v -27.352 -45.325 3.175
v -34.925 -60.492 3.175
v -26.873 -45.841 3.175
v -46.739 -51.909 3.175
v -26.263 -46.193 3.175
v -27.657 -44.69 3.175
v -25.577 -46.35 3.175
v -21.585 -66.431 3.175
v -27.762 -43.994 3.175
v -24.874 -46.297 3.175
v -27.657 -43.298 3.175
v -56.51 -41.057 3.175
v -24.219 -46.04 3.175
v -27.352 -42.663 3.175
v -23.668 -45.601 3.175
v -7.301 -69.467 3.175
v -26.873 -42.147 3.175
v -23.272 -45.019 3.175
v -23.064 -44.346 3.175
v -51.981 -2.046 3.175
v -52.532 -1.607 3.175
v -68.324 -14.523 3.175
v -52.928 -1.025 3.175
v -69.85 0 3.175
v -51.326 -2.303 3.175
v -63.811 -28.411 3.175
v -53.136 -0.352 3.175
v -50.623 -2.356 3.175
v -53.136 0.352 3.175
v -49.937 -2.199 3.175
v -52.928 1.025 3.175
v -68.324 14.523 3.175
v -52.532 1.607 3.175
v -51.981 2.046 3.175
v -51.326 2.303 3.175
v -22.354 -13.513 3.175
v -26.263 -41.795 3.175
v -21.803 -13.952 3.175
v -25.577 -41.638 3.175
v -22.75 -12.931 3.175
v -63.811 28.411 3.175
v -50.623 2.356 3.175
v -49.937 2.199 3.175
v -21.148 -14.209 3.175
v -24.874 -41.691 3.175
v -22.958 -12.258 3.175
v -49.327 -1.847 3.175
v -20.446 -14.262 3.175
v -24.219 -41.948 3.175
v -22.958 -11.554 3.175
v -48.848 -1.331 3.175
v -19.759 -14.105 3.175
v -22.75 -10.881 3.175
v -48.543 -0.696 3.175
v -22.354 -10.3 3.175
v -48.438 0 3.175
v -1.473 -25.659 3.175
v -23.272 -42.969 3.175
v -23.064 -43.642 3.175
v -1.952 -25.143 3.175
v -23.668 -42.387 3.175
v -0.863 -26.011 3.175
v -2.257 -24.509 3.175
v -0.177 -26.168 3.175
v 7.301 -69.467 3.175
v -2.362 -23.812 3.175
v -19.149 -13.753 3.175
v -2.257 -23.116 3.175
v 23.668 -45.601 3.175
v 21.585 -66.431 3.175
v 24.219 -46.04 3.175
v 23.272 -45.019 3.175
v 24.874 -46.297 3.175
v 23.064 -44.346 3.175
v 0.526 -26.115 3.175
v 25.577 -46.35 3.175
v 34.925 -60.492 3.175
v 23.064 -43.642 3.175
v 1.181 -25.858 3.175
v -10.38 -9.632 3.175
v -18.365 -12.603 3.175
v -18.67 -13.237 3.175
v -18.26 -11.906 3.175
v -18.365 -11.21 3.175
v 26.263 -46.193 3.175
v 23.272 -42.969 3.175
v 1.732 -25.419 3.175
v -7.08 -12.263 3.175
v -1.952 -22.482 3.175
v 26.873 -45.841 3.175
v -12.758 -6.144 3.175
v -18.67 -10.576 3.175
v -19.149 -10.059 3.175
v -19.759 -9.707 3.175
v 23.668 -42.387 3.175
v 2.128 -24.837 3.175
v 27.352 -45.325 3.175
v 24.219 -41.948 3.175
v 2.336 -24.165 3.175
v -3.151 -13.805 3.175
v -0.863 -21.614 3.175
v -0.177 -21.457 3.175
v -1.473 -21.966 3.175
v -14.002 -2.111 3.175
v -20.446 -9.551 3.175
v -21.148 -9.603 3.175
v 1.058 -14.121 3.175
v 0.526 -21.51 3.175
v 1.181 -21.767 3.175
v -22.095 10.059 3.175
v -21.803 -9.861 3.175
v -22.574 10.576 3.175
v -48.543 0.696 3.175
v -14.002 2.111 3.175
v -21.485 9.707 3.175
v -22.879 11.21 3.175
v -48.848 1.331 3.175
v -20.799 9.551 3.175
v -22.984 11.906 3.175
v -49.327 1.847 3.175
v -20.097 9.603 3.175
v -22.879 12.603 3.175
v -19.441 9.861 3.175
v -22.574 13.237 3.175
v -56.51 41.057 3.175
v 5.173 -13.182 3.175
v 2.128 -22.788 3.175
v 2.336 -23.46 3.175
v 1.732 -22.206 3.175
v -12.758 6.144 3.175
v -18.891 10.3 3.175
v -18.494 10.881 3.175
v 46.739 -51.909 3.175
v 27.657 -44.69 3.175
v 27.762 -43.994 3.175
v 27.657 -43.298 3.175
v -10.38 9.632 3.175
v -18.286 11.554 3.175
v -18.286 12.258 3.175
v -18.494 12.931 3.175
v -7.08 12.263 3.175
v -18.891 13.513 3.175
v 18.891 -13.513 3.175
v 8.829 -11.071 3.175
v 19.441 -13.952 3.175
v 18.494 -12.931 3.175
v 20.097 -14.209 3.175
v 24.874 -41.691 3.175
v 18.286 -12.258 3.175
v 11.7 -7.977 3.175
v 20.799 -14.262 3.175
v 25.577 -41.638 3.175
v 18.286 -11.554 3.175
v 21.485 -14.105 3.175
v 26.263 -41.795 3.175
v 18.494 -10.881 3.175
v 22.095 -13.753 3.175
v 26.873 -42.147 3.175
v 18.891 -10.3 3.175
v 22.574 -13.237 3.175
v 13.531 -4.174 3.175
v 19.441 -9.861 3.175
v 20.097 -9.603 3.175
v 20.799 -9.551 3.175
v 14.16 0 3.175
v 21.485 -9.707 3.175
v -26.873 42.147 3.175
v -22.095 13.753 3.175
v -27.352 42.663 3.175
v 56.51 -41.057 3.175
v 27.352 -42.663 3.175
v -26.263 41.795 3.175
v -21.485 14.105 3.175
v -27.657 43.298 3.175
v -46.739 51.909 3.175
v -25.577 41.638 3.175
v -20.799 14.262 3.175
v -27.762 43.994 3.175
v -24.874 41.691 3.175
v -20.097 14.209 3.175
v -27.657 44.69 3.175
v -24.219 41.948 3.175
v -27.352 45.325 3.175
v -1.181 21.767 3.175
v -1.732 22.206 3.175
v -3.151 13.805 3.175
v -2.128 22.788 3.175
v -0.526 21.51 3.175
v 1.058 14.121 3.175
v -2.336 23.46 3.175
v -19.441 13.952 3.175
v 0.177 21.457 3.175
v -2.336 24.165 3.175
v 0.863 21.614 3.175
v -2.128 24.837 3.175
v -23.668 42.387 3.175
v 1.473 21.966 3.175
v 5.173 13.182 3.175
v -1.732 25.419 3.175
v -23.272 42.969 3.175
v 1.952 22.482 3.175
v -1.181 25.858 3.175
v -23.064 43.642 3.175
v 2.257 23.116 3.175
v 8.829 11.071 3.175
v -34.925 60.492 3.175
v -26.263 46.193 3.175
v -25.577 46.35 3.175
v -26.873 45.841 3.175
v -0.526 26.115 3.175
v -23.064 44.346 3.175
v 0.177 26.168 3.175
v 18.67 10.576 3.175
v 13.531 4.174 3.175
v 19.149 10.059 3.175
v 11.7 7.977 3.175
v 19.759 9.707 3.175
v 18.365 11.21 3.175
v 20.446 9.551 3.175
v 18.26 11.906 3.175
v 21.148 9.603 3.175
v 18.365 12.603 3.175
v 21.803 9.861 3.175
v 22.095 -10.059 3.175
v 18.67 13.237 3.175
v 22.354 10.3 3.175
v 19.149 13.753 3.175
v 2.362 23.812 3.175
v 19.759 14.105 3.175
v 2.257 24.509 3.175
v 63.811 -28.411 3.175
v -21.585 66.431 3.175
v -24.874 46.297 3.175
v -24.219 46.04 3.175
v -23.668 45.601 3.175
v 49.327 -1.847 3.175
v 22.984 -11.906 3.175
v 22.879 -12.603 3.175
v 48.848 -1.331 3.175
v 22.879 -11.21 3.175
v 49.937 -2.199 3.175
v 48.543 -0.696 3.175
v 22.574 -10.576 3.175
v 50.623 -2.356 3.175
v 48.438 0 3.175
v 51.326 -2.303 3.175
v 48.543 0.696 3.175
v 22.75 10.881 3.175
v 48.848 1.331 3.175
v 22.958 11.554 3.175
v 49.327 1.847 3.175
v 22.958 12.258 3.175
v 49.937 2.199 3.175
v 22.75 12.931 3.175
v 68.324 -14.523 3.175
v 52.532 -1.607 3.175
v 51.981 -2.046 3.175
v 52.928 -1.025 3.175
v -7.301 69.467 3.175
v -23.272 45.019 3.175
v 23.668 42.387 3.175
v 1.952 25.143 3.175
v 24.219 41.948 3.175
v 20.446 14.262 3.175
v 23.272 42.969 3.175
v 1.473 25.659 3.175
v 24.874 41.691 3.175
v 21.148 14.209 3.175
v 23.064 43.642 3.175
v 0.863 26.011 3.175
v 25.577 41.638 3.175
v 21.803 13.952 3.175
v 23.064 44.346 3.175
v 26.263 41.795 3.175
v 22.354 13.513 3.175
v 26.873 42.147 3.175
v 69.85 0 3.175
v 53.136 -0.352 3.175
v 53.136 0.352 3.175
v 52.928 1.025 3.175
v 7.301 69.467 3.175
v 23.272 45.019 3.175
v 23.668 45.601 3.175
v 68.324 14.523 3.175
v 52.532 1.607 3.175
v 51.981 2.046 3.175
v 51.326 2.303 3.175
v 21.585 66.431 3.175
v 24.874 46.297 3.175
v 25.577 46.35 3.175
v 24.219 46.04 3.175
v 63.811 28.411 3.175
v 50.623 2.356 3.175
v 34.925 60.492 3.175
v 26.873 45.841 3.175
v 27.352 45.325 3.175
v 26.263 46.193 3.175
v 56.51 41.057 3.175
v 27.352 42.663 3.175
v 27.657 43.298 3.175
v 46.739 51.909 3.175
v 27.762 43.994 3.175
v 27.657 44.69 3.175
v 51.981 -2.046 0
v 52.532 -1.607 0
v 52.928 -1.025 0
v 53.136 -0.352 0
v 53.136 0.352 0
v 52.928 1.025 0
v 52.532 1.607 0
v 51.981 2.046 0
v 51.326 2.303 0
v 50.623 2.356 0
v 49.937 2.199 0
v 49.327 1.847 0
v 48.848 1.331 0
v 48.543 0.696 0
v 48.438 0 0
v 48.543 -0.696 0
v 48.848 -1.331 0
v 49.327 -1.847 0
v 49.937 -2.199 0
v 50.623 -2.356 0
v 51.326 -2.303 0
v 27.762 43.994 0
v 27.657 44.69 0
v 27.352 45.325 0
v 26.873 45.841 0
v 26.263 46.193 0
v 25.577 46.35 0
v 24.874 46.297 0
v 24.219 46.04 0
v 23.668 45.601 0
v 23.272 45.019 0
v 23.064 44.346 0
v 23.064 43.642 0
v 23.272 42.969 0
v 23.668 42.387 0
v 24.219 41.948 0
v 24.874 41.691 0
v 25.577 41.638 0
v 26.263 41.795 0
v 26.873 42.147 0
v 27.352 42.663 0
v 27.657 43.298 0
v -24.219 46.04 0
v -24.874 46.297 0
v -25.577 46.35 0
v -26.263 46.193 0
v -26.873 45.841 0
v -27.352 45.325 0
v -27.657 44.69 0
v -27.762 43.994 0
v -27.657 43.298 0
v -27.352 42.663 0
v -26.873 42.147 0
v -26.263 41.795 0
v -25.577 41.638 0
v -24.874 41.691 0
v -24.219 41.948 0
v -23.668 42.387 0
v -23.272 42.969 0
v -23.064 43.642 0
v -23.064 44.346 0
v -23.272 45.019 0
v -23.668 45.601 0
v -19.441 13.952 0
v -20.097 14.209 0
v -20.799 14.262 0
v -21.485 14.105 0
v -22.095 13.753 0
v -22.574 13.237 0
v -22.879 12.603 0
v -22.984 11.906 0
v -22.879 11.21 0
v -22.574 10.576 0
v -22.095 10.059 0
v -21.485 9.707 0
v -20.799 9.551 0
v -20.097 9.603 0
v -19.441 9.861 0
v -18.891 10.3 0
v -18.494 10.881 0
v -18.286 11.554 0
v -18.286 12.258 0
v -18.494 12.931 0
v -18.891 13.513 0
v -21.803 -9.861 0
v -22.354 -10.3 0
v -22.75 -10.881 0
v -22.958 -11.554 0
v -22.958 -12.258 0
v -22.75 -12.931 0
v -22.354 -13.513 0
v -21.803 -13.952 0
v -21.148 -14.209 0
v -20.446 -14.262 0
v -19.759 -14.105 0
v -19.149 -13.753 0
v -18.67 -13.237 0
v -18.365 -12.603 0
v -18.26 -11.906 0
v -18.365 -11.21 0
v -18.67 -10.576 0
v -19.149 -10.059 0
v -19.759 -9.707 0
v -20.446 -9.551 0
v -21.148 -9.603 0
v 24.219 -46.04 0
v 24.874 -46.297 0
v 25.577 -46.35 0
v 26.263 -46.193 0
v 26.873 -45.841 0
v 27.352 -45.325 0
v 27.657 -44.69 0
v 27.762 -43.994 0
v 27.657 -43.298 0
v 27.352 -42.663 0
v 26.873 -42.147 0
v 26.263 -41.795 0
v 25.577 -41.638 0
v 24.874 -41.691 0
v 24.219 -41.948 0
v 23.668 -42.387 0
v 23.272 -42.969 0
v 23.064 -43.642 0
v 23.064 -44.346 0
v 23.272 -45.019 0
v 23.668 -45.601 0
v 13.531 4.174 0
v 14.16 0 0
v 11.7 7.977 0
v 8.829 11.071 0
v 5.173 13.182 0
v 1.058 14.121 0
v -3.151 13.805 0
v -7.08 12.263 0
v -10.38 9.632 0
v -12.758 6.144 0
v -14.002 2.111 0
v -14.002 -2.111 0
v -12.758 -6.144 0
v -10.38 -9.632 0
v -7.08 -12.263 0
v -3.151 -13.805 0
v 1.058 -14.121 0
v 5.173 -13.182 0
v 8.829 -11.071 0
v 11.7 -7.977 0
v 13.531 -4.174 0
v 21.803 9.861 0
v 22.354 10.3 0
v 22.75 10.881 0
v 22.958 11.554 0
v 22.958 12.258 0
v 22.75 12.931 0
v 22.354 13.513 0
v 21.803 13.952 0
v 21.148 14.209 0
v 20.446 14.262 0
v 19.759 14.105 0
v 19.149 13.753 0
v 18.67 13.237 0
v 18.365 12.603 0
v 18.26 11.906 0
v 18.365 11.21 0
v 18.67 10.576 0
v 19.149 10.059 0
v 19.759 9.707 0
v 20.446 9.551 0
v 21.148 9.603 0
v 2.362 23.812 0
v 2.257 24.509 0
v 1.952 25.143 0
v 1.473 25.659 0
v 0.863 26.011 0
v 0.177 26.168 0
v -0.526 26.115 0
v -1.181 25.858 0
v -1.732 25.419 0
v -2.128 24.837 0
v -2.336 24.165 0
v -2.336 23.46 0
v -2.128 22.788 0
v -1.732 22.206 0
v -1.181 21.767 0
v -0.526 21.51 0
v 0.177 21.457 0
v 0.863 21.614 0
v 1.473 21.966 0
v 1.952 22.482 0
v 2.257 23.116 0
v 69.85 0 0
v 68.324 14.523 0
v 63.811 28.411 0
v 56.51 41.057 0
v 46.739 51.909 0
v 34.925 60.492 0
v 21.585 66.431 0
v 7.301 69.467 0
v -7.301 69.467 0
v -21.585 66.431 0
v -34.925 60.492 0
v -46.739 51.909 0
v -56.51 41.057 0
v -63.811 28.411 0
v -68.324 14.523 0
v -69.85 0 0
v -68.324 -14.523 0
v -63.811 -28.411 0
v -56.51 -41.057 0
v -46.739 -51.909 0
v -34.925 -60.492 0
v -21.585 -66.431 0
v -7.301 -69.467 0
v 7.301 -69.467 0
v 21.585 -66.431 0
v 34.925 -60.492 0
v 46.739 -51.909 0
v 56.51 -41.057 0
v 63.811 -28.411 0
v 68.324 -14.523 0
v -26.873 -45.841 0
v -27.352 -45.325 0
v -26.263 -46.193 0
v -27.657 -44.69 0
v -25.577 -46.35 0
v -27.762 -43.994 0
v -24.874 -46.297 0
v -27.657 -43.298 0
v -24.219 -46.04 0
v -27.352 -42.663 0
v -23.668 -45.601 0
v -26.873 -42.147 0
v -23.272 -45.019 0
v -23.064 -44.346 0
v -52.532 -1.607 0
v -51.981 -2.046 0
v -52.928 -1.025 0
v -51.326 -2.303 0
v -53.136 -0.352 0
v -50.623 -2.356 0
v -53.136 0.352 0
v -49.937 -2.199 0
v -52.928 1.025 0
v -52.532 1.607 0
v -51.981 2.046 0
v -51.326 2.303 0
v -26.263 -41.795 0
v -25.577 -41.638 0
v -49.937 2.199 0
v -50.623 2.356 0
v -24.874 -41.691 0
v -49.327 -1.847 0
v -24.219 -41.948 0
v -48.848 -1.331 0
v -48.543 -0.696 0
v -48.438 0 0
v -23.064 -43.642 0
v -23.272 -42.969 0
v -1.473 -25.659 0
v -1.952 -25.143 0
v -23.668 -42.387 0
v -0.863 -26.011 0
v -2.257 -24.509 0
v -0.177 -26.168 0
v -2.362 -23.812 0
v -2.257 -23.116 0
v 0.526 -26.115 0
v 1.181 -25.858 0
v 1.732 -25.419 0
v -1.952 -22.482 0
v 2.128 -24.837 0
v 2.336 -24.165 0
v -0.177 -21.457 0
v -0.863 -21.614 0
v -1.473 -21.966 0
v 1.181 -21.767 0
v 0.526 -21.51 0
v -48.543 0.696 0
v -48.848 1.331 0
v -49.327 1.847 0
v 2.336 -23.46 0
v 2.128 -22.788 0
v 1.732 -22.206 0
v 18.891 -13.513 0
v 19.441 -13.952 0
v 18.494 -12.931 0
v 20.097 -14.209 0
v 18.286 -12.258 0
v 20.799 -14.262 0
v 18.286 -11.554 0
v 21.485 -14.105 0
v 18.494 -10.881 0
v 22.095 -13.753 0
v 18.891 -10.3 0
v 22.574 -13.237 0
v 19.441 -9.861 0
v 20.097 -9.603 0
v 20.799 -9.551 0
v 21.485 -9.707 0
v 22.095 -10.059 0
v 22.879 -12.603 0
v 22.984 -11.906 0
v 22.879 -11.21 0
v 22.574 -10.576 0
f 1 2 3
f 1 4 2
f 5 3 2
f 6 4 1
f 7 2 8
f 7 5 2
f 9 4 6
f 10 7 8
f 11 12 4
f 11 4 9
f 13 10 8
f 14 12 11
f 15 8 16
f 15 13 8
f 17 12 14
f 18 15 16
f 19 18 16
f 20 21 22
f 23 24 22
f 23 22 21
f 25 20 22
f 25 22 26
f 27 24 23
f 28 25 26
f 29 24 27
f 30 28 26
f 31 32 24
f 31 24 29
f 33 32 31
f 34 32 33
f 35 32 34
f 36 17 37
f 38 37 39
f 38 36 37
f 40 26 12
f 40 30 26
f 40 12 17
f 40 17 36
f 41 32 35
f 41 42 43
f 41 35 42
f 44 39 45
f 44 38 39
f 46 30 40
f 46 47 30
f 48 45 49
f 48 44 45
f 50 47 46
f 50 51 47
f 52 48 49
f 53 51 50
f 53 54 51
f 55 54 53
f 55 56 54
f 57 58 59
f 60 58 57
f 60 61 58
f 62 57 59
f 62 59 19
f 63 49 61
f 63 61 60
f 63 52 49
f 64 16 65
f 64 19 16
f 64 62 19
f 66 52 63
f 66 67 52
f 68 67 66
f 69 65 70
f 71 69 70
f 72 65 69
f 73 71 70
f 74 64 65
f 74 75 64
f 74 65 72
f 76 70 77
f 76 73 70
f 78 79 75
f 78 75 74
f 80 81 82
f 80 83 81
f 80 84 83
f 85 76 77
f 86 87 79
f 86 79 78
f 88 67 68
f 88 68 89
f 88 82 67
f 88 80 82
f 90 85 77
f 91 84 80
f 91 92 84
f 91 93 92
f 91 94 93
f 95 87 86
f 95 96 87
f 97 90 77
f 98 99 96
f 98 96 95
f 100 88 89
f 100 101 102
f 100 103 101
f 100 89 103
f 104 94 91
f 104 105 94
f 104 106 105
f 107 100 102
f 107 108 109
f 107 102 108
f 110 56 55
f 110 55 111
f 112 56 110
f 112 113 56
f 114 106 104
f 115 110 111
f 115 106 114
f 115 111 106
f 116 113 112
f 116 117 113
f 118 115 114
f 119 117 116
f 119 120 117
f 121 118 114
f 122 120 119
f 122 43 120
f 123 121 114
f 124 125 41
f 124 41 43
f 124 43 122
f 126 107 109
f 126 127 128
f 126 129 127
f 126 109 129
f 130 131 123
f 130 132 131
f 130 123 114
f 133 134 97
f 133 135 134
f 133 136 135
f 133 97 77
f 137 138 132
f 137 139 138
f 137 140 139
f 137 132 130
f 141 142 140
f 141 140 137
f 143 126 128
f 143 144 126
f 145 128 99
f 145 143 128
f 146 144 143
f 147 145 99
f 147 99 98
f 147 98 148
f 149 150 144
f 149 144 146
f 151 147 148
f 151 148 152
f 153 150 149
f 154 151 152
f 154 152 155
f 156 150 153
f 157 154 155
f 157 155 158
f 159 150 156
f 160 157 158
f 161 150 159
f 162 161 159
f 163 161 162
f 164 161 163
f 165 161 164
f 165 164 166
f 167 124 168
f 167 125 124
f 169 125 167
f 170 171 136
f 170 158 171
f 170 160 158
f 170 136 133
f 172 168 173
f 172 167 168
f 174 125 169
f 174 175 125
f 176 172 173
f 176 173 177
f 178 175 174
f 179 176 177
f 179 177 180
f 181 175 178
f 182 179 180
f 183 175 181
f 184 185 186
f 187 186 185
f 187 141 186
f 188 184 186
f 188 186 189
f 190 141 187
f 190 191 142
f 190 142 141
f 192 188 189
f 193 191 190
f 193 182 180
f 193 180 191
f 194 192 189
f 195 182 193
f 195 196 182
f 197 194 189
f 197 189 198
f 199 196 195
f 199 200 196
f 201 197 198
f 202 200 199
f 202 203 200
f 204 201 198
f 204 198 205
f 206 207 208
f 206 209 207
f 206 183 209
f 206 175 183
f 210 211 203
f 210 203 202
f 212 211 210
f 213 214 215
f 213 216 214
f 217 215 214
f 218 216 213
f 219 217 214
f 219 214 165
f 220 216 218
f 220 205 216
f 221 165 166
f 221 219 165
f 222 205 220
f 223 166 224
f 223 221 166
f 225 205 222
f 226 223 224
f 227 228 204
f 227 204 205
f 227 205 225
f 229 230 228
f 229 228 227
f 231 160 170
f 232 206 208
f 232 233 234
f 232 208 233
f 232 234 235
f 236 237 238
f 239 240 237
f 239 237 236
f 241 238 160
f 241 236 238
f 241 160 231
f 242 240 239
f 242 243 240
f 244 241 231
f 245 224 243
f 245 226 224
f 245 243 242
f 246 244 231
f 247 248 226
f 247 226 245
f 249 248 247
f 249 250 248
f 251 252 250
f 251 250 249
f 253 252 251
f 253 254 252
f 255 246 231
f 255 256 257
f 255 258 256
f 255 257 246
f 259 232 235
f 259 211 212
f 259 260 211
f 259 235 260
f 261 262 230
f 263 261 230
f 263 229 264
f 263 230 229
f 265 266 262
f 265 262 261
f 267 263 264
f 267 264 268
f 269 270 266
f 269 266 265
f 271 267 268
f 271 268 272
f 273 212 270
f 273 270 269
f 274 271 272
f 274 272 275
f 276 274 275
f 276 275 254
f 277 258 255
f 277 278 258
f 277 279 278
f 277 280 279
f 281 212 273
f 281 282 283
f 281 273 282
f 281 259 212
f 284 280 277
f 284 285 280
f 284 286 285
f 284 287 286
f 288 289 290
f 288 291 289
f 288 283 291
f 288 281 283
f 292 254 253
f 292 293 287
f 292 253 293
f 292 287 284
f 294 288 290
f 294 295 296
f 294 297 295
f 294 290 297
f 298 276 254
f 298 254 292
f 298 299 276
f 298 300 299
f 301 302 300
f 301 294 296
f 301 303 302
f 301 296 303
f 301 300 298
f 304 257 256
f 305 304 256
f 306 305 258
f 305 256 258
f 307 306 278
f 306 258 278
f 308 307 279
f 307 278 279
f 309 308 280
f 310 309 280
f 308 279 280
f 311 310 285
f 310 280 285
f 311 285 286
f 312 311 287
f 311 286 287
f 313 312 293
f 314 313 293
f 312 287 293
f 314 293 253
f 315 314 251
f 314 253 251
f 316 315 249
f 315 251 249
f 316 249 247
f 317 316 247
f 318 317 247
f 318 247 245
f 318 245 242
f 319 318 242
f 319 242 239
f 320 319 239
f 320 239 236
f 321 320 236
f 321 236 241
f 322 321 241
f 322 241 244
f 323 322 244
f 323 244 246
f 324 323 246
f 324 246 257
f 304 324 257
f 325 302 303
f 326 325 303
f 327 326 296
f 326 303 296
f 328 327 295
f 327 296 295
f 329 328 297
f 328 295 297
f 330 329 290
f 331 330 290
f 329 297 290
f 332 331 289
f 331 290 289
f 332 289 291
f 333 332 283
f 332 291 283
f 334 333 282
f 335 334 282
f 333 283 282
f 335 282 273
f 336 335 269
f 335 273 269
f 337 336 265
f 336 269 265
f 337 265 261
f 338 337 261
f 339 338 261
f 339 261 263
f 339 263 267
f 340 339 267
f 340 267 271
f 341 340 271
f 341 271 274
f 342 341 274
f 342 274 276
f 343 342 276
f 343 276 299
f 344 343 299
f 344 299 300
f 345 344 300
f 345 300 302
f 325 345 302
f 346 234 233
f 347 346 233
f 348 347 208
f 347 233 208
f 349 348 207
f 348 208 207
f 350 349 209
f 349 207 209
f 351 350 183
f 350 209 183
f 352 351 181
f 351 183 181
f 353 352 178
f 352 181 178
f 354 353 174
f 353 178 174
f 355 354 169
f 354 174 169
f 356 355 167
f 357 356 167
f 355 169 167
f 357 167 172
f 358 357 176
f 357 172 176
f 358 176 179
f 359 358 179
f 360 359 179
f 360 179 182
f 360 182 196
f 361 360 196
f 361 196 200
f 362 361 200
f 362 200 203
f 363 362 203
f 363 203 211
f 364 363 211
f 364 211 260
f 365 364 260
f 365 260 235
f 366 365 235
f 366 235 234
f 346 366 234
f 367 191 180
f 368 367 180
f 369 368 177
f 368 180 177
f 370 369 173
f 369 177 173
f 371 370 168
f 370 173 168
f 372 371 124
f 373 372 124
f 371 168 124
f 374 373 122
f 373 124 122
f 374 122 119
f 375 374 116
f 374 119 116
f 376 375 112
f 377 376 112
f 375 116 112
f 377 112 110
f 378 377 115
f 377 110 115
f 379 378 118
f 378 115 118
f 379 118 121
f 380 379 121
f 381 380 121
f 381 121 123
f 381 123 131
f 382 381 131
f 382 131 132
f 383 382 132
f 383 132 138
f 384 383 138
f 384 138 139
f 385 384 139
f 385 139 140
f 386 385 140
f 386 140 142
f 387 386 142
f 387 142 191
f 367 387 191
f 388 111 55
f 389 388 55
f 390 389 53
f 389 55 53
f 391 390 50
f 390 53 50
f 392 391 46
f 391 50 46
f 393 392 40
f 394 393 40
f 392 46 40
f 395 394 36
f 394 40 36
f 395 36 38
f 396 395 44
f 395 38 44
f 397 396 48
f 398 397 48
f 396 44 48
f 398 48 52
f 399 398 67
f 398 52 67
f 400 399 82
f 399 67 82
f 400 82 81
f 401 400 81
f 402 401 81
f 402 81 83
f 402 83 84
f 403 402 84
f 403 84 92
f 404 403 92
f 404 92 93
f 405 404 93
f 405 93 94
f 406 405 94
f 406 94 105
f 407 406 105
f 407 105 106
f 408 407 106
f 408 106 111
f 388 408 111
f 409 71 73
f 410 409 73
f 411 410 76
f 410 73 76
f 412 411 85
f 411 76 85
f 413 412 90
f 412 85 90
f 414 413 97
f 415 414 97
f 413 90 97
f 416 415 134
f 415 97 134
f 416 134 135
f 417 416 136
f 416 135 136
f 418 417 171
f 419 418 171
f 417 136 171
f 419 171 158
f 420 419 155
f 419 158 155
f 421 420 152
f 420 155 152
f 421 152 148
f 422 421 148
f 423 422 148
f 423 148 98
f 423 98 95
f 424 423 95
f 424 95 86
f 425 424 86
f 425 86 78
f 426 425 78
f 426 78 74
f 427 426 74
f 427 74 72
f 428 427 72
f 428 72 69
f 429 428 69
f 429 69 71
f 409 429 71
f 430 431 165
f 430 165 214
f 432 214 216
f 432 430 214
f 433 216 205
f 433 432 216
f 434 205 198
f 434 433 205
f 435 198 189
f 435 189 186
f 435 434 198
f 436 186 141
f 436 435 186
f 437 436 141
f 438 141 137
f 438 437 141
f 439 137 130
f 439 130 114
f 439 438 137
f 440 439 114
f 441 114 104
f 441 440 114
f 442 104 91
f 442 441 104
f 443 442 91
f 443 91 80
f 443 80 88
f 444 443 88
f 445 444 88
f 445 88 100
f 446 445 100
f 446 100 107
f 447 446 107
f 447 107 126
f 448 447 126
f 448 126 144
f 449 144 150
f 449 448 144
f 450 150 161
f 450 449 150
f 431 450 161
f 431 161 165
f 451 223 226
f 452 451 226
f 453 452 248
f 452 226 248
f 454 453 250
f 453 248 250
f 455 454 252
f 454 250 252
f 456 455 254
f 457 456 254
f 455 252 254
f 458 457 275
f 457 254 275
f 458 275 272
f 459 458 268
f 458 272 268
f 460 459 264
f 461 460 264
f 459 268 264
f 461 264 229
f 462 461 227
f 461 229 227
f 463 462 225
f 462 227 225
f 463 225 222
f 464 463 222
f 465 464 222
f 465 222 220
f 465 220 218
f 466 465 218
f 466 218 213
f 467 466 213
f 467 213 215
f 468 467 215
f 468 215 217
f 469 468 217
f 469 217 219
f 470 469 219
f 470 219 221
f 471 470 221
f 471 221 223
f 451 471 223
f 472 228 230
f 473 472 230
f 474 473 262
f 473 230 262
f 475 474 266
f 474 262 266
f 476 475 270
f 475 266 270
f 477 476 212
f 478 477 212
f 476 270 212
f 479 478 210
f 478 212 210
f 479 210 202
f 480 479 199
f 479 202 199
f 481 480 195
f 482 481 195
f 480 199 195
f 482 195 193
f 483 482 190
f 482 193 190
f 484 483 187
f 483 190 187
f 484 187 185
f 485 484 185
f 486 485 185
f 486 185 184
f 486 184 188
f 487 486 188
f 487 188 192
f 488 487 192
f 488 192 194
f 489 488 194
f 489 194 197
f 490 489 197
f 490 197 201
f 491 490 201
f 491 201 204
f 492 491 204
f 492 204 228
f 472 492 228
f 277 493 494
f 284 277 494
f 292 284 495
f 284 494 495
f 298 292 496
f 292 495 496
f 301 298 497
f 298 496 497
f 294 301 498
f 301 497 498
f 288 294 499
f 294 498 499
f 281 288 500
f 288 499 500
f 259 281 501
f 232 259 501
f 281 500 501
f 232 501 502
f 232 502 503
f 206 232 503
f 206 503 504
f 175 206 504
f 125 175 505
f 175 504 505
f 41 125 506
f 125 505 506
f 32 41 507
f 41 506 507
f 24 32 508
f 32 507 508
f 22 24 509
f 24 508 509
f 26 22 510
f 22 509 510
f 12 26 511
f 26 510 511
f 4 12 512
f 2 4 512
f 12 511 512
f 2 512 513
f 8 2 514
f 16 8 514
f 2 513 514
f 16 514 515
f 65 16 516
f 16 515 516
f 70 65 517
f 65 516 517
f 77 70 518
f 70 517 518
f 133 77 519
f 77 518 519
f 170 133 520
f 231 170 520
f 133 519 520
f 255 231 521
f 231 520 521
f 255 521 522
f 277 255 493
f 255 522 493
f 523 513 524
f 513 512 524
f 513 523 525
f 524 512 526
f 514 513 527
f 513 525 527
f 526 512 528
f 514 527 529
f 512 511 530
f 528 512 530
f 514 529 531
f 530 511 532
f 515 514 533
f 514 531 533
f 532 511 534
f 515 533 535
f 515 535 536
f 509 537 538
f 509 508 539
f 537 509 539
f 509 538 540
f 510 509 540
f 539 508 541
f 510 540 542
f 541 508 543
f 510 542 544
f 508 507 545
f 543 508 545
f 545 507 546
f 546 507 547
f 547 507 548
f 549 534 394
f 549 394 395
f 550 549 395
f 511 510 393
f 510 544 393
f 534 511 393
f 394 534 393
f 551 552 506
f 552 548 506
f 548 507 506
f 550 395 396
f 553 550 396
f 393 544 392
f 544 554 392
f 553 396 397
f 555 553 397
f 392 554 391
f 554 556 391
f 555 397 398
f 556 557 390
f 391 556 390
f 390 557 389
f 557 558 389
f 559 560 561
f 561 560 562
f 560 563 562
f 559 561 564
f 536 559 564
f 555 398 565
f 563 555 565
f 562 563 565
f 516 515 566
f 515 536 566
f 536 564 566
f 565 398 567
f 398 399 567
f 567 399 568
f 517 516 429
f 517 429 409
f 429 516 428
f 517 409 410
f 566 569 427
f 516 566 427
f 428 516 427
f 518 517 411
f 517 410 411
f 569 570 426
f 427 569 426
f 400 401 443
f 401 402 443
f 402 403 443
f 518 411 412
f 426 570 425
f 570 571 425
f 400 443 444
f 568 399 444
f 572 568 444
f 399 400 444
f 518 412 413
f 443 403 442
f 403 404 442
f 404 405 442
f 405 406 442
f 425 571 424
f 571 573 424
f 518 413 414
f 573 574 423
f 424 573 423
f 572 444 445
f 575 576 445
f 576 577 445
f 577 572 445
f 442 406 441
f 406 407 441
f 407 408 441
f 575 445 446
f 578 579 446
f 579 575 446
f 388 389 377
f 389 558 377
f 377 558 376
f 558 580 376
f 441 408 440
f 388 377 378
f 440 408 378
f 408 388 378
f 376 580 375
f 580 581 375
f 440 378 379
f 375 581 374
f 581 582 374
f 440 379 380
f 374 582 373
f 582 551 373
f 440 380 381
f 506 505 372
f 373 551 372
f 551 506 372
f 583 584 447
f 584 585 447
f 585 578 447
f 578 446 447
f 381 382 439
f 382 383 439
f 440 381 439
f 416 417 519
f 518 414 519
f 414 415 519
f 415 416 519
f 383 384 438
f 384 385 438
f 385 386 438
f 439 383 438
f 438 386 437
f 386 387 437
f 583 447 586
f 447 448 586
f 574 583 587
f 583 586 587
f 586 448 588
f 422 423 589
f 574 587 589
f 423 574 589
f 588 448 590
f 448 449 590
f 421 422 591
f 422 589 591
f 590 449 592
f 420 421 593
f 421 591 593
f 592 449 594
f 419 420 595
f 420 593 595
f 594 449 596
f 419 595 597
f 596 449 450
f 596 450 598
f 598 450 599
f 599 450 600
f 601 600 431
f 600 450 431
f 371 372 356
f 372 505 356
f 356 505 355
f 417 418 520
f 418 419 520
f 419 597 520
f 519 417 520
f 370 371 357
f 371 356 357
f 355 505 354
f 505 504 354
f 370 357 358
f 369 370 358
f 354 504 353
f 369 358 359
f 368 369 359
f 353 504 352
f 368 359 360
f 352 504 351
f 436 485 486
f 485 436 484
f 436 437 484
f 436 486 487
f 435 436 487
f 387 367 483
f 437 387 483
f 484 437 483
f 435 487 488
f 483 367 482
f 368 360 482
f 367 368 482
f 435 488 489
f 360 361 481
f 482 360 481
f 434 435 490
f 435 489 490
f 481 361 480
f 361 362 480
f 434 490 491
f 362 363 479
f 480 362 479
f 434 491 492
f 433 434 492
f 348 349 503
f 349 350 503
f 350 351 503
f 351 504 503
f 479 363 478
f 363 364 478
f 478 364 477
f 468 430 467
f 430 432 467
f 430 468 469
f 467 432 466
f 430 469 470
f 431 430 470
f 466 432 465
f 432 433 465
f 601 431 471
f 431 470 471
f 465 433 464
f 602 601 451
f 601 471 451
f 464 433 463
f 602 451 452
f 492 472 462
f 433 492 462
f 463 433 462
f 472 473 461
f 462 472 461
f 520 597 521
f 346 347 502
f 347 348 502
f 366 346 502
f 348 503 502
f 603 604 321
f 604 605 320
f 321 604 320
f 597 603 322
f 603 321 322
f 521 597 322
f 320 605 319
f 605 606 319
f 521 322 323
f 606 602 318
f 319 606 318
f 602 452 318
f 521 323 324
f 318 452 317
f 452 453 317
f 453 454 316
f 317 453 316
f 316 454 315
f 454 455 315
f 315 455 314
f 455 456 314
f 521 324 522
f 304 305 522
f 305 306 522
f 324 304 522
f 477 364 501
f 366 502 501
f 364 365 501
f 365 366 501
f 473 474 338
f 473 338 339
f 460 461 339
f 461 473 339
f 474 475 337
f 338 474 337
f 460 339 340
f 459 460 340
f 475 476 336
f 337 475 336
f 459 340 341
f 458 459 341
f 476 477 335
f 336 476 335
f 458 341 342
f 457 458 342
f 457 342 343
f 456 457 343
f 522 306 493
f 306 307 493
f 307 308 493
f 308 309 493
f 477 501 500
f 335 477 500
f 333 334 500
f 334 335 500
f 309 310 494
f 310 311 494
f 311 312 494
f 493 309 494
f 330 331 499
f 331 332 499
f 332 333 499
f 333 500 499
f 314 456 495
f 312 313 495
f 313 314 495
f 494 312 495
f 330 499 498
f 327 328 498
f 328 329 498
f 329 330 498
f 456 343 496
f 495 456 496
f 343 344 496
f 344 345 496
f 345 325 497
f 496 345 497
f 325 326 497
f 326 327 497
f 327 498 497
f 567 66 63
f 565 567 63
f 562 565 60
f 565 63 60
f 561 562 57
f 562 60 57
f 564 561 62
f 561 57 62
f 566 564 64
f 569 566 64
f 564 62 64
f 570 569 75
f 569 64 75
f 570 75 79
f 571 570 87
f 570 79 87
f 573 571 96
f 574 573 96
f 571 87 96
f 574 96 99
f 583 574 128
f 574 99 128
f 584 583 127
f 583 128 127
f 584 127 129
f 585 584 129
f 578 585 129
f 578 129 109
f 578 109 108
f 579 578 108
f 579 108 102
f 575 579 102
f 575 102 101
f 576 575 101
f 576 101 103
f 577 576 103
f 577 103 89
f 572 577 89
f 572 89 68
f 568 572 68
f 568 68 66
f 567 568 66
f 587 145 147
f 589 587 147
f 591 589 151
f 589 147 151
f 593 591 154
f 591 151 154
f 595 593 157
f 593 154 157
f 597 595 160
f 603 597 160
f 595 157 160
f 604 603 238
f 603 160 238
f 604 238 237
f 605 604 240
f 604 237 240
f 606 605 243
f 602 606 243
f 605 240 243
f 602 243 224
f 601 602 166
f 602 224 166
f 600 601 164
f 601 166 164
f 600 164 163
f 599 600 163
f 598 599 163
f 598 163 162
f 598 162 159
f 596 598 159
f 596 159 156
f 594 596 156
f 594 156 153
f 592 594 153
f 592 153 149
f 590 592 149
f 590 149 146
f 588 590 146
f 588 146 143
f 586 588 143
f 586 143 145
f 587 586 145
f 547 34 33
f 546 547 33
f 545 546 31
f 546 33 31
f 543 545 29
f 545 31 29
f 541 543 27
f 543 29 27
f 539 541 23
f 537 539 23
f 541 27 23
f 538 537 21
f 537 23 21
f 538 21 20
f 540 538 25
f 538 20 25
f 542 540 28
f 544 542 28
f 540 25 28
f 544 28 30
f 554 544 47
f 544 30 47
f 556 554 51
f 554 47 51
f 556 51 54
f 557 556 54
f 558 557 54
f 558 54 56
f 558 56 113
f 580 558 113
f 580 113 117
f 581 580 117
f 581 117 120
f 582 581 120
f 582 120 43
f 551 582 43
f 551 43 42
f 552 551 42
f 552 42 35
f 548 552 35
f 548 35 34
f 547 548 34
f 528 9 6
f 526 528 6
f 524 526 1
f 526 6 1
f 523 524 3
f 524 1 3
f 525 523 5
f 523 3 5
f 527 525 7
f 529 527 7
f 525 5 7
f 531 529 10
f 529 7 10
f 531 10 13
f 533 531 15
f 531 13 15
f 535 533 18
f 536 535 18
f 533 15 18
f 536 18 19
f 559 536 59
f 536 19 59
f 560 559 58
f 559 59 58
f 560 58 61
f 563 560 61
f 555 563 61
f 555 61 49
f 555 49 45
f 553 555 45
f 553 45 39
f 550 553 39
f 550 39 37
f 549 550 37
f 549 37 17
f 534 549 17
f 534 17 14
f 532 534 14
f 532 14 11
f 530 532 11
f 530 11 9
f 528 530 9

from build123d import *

# Parameters (mm, degrees)
F0_R            = 69.85
F0_R_2          = 14.1605
F1_DEPTH        = 3.175
F2_R            = 2.3622
F3_DEPTH        = 3.176
F3_COPIES_COUNT = 6


# Not quite as in the source:
# - a pattern or mirror of a feature is missing from the dataset's text; its kind, count and spacing are read off the source's solid


with BuildPart() as f1:
    # F0 (on Top) → F1 (new body)
    with BuildSketch(Plane.XY):
        Circle(F0_R)
        Circle(F0_R_2, mode=Mode.SUBTRACT)
    extrude(amount=F1_DEPTH)

    # F2 (on face) → F3 (cut, through all)
    with BuildSketch(Plane.XY.offset(3.175)):
        with Locations((0, 23.8125)):
            Circle(F2_R)
        with Locations((25.4, 43.9940905122)):
            Circle(F2_R)
    f3 = extrude(amount=-F3_DEPTH, mode=Mode.SUBTRACT)

    # F3_copies: F3 ×6 about axis
    f3_copies_axis = Axis((0, 0, 0), (0, 0, 1))
    for i in range(1, F3_COPIES_COUNT):
        add(f3.rotate(f3_copies_axis, i * 360 / F3_COPIES_COUNT), mode=Mode.SUBTRACT)


solid = f1.part
